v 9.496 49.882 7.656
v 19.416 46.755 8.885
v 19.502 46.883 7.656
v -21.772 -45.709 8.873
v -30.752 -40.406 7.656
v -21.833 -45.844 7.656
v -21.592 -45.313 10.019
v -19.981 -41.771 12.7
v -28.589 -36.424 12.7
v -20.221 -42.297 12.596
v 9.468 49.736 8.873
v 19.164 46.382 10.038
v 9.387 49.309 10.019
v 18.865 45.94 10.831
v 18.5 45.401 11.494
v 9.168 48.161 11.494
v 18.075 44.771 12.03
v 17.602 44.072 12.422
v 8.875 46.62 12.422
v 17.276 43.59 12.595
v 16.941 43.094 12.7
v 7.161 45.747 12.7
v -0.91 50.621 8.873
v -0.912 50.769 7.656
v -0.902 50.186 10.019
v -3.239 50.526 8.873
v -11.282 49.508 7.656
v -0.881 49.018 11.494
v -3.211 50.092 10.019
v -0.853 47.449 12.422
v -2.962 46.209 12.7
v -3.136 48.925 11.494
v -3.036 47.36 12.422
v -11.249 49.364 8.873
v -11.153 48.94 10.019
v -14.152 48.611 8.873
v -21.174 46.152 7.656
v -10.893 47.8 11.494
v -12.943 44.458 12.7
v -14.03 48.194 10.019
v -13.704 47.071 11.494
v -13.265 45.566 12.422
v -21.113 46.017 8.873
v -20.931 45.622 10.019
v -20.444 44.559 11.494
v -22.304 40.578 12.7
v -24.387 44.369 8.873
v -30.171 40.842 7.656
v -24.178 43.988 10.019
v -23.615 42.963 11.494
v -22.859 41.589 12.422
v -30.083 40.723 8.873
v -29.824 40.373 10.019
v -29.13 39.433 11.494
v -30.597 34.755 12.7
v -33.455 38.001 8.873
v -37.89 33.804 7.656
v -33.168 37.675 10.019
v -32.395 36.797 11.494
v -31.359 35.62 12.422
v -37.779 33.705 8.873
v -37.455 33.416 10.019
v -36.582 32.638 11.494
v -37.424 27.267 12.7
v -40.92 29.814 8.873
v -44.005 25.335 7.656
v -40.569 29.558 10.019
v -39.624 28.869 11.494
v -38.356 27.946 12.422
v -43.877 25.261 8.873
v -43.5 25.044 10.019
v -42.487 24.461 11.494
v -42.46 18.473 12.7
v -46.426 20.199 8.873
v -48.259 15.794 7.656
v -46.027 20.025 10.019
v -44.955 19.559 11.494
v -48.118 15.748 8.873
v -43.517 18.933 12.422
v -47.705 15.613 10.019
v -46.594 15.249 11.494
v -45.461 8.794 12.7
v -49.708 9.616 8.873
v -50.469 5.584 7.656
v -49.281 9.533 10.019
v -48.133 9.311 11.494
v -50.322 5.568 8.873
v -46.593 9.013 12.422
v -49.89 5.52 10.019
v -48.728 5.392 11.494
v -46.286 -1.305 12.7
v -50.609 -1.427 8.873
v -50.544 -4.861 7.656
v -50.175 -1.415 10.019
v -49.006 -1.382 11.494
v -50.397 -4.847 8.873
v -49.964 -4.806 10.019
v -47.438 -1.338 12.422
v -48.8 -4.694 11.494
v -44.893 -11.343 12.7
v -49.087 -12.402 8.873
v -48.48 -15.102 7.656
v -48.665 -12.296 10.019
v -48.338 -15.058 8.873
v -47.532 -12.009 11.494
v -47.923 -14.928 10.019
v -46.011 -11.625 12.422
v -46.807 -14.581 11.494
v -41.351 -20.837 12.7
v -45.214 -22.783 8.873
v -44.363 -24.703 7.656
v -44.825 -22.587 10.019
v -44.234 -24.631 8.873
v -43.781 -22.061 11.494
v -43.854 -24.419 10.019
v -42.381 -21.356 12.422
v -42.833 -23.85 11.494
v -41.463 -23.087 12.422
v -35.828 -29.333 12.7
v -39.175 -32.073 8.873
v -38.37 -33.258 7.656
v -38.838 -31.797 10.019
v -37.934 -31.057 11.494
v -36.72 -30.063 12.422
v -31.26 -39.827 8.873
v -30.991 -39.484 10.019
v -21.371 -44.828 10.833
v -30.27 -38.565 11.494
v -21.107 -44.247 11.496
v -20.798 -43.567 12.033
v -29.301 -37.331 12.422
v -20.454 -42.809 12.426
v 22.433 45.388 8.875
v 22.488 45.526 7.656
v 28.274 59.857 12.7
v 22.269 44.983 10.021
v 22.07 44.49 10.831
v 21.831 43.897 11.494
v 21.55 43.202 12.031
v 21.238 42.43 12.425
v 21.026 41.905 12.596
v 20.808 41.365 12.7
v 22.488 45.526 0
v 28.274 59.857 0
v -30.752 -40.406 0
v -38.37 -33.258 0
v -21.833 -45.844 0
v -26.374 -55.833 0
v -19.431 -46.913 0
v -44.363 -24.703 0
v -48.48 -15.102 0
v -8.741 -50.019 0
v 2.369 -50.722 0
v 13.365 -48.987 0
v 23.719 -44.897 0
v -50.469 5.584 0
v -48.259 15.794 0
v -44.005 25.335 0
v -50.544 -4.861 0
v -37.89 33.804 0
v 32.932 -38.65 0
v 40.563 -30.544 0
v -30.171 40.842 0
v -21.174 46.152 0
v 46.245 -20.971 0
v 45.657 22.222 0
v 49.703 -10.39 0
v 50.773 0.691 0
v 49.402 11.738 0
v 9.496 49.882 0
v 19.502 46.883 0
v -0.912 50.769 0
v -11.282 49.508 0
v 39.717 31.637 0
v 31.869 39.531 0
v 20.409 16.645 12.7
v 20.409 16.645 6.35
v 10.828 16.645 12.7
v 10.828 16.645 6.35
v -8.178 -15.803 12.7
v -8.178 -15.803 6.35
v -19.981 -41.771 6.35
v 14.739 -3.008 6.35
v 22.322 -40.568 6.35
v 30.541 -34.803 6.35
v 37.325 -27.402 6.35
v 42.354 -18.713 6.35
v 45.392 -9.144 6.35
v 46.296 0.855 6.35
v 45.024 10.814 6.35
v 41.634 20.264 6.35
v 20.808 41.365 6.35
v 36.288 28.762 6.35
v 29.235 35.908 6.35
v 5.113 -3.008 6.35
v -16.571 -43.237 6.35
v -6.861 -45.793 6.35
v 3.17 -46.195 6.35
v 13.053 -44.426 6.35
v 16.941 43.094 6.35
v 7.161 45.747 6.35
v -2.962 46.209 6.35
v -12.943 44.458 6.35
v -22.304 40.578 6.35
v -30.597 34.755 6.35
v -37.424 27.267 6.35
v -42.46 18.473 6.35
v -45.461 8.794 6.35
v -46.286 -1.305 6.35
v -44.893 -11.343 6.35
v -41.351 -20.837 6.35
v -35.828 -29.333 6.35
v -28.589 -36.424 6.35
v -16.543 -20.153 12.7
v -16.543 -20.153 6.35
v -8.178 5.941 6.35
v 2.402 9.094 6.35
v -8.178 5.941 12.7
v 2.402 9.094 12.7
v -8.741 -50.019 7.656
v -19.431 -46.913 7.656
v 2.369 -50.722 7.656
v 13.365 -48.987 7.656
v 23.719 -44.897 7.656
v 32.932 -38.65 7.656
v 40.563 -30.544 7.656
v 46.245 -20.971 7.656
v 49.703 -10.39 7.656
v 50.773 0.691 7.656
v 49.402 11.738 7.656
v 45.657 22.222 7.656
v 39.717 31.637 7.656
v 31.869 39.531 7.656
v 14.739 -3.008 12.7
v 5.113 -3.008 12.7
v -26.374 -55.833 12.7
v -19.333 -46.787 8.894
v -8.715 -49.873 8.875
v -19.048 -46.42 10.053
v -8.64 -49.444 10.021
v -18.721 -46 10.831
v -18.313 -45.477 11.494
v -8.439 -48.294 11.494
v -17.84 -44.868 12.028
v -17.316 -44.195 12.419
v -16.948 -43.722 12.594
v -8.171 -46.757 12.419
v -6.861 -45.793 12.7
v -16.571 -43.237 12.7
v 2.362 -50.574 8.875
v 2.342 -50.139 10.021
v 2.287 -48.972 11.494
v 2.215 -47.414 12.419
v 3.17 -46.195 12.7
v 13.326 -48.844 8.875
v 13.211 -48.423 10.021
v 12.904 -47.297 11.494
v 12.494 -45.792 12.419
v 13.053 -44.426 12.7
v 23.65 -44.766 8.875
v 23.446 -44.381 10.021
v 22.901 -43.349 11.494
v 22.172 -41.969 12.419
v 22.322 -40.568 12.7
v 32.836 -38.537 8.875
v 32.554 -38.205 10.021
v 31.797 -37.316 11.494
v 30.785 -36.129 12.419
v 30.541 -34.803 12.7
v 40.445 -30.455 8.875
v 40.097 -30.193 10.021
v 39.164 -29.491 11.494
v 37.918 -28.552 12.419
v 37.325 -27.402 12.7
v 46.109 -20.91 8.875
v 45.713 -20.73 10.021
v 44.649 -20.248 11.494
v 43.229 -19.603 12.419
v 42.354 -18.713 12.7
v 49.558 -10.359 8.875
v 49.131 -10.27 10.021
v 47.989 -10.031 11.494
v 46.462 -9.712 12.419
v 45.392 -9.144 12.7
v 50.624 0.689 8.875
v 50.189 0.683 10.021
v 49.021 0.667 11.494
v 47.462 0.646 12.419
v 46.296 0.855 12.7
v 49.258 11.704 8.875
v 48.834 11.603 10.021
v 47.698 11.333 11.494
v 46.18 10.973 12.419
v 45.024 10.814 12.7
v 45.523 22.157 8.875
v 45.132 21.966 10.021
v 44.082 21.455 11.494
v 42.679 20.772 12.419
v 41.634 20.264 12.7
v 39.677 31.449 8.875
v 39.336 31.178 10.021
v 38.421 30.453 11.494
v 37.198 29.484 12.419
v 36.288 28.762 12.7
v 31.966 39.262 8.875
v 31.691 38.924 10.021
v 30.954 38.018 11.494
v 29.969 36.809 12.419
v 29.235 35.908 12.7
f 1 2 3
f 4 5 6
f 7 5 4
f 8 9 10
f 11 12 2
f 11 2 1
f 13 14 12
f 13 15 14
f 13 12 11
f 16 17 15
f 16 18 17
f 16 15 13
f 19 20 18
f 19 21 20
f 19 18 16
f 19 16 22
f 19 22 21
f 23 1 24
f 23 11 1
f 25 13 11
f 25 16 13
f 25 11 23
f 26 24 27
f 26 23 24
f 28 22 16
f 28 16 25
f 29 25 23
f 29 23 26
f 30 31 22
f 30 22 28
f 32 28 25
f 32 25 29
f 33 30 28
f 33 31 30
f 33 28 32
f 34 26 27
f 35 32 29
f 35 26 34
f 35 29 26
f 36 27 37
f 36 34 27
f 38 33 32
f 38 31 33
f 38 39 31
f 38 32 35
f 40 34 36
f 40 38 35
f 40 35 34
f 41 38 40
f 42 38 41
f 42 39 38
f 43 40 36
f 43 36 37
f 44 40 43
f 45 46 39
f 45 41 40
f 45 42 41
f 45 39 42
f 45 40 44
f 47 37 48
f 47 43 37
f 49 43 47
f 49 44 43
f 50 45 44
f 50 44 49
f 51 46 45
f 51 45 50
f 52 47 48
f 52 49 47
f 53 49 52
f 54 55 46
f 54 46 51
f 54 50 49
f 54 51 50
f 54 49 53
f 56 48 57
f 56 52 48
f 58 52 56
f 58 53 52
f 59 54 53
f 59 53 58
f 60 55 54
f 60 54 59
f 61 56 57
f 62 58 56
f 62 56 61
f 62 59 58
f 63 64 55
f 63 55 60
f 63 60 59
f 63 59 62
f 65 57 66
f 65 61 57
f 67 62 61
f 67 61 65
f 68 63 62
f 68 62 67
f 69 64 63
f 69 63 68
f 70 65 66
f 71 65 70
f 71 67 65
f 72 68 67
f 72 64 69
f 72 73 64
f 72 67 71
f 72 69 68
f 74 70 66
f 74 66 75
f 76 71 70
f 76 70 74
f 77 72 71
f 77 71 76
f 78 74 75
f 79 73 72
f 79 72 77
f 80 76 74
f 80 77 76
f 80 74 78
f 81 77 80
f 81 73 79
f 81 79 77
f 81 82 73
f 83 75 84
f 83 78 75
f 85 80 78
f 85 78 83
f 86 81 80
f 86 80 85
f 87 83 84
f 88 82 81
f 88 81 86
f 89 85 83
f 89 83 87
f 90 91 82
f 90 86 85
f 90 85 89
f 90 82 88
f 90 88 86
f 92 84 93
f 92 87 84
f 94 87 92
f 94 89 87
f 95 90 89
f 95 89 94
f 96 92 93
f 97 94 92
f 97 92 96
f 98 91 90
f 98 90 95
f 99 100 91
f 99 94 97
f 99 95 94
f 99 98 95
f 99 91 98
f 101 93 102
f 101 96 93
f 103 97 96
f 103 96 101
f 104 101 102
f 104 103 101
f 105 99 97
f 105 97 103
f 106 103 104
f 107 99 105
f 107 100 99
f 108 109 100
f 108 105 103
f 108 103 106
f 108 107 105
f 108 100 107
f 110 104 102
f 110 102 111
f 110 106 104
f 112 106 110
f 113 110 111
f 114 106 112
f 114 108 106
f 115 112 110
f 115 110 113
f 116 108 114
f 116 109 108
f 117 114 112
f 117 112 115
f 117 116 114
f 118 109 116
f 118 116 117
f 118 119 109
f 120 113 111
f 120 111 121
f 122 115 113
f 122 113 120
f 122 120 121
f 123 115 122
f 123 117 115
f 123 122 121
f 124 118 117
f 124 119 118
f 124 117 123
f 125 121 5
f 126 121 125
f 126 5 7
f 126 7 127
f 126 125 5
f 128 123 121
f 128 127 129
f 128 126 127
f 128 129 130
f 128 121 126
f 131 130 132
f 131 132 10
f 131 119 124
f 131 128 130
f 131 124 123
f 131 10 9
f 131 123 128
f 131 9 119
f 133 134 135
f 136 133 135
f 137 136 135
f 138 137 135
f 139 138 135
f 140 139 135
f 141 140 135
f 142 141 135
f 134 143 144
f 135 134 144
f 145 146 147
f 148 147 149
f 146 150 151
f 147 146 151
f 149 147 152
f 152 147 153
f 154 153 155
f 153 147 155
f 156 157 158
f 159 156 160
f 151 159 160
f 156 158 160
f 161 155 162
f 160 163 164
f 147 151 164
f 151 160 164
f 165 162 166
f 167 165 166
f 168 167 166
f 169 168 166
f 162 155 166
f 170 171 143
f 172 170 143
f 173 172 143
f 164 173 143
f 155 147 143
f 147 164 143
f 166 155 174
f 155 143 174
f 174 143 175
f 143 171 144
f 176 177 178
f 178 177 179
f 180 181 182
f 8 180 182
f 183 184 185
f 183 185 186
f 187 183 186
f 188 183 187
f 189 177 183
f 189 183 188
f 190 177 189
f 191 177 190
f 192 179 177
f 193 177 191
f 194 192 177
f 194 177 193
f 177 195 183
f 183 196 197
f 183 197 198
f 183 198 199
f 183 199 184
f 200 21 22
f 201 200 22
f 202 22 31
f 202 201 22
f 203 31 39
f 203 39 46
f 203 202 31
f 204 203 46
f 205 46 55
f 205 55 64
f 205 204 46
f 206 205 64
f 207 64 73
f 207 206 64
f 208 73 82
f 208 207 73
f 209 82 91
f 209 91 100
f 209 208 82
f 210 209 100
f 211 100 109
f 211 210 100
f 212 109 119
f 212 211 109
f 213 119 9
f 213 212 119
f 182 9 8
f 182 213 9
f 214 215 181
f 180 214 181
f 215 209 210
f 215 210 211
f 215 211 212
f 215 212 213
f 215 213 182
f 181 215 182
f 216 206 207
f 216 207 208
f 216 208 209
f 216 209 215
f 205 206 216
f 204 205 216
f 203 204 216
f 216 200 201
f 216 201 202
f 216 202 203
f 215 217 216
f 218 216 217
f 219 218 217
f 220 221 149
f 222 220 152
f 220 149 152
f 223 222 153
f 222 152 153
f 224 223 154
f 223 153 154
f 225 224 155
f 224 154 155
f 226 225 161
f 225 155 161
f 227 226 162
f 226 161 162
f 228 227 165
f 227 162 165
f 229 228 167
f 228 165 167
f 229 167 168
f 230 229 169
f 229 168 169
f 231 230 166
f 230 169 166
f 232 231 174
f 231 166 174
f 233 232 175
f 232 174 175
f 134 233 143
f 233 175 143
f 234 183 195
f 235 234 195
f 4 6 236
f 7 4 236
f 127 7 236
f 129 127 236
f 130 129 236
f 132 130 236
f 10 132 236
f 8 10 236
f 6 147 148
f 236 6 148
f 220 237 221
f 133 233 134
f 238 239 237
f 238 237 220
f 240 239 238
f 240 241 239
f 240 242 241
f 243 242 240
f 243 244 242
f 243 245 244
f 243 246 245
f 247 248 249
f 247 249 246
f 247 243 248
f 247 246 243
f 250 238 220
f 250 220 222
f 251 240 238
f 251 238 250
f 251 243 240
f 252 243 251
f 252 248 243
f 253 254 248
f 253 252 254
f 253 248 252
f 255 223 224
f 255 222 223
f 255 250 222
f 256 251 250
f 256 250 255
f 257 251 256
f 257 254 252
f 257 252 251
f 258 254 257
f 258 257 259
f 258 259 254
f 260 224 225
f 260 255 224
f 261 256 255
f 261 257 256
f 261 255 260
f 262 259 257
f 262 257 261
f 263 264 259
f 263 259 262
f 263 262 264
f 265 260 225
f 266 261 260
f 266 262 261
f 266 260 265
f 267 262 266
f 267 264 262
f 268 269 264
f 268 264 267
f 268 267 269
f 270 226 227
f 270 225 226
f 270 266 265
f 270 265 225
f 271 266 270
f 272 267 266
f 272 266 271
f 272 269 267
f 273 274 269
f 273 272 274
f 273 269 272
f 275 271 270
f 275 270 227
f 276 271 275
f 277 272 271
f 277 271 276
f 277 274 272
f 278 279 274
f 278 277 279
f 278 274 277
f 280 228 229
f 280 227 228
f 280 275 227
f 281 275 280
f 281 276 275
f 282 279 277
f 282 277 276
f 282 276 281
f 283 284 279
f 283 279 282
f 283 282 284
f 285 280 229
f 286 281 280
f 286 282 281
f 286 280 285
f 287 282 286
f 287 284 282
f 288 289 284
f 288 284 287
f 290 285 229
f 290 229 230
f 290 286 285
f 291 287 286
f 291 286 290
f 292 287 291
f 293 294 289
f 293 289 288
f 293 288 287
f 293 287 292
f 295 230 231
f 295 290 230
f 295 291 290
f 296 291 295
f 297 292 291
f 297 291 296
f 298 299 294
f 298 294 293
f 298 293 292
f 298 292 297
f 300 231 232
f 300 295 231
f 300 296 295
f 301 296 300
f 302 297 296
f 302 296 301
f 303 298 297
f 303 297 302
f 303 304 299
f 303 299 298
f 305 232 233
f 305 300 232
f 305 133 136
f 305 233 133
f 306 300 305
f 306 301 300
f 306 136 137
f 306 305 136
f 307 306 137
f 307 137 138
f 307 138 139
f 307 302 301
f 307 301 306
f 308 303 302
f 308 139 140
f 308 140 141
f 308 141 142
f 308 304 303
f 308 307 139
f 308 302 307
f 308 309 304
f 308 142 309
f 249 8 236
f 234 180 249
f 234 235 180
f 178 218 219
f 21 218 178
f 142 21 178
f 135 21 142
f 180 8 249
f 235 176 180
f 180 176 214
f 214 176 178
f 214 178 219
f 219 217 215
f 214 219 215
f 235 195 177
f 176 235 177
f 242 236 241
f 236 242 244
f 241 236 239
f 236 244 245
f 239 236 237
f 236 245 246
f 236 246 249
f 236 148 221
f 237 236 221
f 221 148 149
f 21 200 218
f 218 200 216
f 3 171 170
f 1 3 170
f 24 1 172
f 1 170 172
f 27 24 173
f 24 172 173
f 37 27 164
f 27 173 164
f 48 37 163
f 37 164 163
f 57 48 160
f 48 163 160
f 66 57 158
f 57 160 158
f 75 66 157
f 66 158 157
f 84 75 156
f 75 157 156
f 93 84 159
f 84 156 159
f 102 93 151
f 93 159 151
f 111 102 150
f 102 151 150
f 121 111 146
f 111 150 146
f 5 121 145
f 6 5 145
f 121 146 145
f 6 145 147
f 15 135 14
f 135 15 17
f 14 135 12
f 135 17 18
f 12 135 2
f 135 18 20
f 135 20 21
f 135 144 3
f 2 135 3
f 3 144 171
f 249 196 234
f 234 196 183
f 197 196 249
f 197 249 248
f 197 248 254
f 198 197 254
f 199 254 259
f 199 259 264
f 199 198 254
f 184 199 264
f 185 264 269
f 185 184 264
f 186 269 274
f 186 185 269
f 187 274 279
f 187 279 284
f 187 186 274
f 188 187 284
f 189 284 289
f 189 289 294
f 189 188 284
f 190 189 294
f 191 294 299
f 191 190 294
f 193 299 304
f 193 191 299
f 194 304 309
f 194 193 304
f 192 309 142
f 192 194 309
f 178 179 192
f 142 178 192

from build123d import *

# Parameters (mm, degrees)
F0_R     = 46.303997109
F1_DEPTH = 6.35
F0_R_2   = 50.7773250867
F2_DEPTH = 12.7
F5_DEPTH = 6.35
F6_DEPTH = 12.7


# Not quite as in the source:
# - a fillet or chamfer that OpenCascade refuses, or shapes differently, is made with other operations: its cross-section is extruded or revolved along the edge and cut away or added


with BuildPart() as f1:
    # F0 (on Top) → F1 (new body)
    with BuildSketch(Plane.XY):
        Circle(F0_R)
    extrude(amount=F1_DEPTH)

    # F0 (on Top) → F2 (join)
    with BuildSketch(Plane.XY):
        Circle(F0_R_2)
        Circle(F0_R, mode=Mode.SUBTRACT)
    extrude(amount=F2_DEPTH)

    # F3: fillet of radius 5.08 on 1 edges, made by hand

    # F3_s1 → F3_t2 (revolve, cut)
    with BuildSketch(Plane.XZ):
        with BuildLine():
            ThreePointArc((50.7773250867, 7.6563555778), (49.4978706971, 11.0271497073), (46.303997109, 12.7))
            Line((46.303997109, 12.7), (46.3161305494, 12.8008728884))
            ThreePointArc((46.3161305494, 12.8008728884), (48.5406610978, 12.8016), (50.7773250867, 12.8016))
            Line((50.7773250867, 12.8016), (50.8789250867, 12.7))
            Line((50.8789250867, 12.7), (50.8789250867, 7.6563555778))
            Line((50.8789250867, 7.6563555778), (50.7773250867, 7.6563555778))
        make_face()
    revolve(axis=Axis((0, 0, 12.7), (0, 0, 1)), mode=Mode.SUBTRACT)

    # F4 (on face) → F5 (join)
    with BuildSketch(Plane.XY.offset(6.35)):
        Polygon((-8.1779062748, -15.8028278183), (-26.3735784938, -55.8334334653), (14.7386826575, -3.0078946147), (5.1134219393, -3.0078946147), (20.4086864271, 16.6451374931), (10.8284205198, 16.6451374931), (28.2742083073, 59.8571076989), (-8.1779062748, 5.9409798123), (2.4016224779, 9.0941041708), (-16.5434218943, -20.15289478), align=None)
    extrude(amount=F5_DEPTH)

    # F6 (add): a face of the model
    f6_faces = [f1.faces().sort_by_distance(p)[0] for p in [
        (2.0188421937, 0.3767409736, 12.7),
    ]]
    extrude(f6_faces, amount=-F6_DEPTH)


solid = f1.part
